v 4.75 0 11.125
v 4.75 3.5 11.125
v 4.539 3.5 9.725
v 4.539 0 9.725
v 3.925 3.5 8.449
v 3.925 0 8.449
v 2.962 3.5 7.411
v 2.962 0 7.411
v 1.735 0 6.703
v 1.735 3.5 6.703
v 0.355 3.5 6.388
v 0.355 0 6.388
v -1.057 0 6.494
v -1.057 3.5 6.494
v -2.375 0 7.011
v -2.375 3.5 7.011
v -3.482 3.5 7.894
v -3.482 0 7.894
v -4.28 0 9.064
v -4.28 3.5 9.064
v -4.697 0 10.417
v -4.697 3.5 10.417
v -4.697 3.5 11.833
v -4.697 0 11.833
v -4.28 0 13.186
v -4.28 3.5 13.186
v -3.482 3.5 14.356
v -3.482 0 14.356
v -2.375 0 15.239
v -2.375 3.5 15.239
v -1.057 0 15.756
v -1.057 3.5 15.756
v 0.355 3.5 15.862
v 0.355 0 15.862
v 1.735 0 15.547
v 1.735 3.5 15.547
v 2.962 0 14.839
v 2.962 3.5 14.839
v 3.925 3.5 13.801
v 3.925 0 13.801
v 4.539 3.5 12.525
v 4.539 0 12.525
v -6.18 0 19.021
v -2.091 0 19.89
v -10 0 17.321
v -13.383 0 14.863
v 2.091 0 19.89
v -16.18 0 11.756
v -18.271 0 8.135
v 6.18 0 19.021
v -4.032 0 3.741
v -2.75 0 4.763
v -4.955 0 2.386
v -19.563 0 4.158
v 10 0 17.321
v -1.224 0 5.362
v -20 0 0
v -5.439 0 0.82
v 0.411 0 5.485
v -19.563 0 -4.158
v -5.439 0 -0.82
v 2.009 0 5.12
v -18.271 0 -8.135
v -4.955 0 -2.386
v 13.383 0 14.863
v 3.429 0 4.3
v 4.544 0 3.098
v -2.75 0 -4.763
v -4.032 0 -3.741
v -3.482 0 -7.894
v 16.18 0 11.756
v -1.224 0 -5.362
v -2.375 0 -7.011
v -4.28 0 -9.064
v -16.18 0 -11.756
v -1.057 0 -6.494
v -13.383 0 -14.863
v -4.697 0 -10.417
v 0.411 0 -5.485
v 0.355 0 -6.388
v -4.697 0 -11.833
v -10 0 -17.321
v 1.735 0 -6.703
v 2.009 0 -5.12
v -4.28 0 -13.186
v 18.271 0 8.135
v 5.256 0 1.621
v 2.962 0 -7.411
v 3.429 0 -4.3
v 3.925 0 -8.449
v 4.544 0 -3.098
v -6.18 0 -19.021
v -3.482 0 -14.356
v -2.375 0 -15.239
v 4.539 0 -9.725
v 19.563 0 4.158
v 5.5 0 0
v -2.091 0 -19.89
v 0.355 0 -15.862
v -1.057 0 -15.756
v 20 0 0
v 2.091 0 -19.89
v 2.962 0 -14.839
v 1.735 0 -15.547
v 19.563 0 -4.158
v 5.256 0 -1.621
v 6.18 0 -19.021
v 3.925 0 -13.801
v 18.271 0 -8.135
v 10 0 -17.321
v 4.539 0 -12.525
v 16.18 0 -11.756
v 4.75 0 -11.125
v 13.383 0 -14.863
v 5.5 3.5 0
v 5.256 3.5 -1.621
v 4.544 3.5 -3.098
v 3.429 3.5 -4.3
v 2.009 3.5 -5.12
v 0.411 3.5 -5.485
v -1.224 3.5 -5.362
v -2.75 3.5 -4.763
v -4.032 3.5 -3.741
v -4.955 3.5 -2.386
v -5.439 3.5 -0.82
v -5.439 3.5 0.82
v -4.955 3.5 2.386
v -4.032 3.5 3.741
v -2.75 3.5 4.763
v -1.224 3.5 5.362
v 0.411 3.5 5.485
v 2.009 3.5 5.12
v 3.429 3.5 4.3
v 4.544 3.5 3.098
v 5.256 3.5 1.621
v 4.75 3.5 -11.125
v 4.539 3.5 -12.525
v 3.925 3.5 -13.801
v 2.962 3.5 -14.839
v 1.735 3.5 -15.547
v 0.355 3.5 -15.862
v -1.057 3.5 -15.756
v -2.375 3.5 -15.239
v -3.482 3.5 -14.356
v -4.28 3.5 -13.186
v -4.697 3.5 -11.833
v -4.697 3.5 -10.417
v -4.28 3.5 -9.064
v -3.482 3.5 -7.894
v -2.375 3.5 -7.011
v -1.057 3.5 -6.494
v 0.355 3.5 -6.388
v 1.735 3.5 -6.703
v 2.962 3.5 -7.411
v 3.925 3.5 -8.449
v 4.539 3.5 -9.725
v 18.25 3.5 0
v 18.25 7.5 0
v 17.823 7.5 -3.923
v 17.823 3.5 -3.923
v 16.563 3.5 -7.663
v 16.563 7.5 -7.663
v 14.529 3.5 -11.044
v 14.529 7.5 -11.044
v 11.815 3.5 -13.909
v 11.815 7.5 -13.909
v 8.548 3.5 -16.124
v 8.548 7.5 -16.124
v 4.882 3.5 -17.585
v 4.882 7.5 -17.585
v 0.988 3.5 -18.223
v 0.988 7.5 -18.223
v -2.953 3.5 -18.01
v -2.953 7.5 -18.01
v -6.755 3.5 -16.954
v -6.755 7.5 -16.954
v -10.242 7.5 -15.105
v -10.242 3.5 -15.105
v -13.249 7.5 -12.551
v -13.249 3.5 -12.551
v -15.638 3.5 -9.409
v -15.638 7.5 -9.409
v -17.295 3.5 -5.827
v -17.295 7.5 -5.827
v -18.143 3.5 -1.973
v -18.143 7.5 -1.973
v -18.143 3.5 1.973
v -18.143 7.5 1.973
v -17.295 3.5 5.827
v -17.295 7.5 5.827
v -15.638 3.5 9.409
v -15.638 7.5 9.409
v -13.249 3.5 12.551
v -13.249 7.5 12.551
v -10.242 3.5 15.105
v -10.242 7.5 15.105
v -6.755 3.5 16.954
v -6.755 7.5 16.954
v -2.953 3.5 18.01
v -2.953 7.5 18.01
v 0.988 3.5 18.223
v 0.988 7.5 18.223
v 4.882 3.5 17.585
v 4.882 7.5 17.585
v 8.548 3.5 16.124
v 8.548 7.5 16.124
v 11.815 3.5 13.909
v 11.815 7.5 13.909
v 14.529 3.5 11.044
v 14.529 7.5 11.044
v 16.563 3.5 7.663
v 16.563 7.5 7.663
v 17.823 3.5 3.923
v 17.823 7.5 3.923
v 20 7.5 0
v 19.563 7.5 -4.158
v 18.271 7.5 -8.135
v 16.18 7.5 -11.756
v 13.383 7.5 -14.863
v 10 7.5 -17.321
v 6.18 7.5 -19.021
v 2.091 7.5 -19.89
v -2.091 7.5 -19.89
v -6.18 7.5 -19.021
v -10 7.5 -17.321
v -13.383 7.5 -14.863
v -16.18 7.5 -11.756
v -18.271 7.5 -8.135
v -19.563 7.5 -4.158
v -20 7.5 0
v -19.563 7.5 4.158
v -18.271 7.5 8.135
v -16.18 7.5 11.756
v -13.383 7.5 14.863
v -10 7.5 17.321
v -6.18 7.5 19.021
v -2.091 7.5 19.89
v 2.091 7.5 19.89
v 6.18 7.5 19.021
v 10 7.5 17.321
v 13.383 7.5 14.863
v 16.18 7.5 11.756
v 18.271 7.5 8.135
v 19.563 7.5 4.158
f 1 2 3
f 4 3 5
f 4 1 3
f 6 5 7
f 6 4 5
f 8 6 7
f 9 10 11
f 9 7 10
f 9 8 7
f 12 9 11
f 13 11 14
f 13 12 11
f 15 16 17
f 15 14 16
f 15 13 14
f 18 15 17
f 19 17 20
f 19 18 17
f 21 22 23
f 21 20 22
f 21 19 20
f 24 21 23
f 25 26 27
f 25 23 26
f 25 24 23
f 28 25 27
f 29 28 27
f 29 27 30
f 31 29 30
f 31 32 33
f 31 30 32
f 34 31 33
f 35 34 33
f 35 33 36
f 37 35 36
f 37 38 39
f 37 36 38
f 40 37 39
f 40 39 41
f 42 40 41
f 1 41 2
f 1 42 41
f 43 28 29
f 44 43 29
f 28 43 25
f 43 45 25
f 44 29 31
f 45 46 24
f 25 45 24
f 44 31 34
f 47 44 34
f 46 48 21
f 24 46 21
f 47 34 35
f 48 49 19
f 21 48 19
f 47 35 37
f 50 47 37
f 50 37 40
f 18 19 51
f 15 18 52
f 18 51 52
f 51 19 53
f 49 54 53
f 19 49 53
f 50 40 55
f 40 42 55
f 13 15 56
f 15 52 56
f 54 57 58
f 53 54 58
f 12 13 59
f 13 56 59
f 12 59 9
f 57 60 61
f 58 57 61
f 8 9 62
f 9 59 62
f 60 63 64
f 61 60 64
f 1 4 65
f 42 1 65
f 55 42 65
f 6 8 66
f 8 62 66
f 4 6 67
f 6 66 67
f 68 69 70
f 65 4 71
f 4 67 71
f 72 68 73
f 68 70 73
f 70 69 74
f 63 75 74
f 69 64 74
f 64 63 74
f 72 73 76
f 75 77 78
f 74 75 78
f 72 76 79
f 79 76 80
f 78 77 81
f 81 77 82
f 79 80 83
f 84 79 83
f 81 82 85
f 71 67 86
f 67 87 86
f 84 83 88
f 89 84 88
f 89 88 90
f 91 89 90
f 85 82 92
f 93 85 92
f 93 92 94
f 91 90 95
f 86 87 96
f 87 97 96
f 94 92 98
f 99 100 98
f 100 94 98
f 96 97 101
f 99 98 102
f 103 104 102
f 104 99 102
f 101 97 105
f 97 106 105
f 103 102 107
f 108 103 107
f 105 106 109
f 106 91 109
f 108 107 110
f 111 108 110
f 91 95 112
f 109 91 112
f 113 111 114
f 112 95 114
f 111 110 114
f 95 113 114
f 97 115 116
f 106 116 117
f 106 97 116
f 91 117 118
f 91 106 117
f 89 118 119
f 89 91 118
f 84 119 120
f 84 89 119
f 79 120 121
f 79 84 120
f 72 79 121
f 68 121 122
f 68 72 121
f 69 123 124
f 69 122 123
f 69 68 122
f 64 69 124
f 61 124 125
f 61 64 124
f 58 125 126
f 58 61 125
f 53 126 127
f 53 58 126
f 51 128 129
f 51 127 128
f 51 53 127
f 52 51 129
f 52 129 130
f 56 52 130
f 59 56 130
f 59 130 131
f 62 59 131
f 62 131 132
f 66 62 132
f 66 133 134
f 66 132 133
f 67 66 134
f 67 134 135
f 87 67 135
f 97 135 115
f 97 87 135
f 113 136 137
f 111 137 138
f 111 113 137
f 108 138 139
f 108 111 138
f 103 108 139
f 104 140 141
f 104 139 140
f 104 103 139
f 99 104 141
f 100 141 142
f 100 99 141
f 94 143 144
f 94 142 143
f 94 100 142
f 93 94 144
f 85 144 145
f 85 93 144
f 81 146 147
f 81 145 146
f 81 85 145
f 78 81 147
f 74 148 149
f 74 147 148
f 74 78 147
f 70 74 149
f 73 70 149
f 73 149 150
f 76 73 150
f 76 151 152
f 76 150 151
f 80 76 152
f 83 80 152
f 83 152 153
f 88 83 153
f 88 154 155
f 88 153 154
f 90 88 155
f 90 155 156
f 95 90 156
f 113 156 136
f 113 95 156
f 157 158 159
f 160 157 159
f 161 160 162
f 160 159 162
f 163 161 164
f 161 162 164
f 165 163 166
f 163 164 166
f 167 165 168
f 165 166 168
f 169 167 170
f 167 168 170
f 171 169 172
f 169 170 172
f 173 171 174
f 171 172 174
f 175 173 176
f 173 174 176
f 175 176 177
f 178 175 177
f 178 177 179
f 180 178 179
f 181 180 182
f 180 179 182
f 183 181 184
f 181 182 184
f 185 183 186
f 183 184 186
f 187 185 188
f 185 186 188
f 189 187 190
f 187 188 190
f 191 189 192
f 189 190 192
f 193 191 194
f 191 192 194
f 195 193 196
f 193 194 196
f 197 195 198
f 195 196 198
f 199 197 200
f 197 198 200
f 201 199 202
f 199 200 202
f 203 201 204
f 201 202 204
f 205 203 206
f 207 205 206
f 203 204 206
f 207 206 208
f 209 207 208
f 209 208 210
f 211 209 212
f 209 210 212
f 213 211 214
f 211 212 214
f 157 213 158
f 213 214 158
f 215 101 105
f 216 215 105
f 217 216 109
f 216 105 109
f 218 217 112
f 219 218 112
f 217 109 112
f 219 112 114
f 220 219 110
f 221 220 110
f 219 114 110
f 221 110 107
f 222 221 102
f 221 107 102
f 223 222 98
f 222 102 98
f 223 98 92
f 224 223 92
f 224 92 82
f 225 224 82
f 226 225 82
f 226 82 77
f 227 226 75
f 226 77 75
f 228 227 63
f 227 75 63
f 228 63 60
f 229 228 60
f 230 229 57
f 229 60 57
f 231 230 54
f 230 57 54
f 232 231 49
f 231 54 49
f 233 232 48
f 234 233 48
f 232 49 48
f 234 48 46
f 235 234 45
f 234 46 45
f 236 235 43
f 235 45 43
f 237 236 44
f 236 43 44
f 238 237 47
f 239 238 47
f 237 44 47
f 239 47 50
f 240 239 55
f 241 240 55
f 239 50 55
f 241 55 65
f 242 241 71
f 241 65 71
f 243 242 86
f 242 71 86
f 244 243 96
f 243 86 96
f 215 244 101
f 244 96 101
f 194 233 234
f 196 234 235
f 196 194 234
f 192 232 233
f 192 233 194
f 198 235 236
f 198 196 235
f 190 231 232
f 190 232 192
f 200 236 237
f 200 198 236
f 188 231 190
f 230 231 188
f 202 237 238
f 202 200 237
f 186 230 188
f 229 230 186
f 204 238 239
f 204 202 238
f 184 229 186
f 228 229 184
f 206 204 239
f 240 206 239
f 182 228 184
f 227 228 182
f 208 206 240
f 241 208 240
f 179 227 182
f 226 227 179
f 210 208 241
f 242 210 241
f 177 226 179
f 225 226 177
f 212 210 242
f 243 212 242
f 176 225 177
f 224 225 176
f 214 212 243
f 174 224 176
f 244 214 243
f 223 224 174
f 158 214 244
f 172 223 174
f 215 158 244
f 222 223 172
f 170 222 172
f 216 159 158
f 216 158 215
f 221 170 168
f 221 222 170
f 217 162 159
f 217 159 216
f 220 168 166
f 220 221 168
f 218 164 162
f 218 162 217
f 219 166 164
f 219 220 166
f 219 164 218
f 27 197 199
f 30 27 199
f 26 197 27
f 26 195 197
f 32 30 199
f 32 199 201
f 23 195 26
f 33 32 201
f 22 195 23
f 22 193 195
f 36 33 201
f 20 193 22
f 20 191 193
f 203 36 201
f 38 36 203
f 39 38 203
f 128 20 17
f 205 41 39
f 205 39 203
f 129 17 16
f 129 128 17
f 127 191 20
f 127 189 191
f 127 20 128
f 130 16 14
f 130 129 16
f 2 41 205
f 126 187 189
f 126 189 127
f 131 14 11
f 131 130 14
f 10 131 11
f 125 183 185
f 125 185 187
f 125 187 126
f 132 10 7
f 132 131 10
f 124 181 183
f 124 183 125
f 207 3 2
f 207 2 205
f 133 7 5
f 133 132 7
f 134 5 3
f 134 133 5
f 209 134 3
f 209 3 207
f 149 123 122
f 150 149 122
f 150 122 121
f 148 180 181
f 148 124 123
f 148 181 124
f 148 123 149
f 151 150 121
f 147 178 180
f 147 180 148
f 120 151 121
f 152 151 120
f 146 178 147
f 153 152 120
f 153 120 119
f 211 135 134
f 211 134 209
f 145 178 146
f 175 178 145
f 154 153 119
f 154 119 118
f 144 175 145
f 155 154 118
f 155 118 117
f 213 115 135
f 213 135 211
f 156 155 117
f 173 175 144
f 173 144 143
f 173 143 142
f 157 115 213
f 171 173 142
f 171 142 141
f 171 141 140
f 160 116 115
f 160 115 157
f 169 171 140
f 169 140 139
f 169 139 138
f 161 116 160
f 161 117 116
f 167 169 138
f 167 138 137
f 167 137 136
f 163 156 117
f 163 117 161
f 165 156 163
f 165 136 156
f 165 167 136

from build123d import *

# Parameters (mm, degrees)
SKETCH4_R        = 20
SKETCH4_R_2      = 5.5
SKETCH4_R_3      = 4.75
LIDBASE_DEPTH    = 7.5
SKETCH5_R        = 18.25
LIDGROOVES_DEPTH = 4


with BuildPart() as part:
    # Sketch4 → LidBase (new body)
    with BuildSketch(Plane(origin=(0, 0, 0), x_dir=(1, 0, 0), z_dir=(0, 1, 0))):
        Circle(SKETCH4_R)
        Circle(SKETCH4_R_2, mode=Mode.SUBTRACT)
        with Locations((0, 11.125)):
            Circle(SKETCH4_R_3, mode=Mode.SUBTRACT)
        with Locations((0, -11.125)):
            Circle(SKETCH4_R_3, mode=Mode.SUBTRACT)
    extrude(amount=LIDBASE_DEPTH)

    # Sketch5 → LidGrooves (cut)
    with BuildSketch(Plane(origin=(0, 7.5, 0), x_dir=(1, 0, 0), z_dir=(0, 1, 0))):
        Circle(SKETCH5_R)
    extrude(amount=-LIDGROOVES_DEPTH, mode=Mode.SUBTRACT)


solid = part.part
